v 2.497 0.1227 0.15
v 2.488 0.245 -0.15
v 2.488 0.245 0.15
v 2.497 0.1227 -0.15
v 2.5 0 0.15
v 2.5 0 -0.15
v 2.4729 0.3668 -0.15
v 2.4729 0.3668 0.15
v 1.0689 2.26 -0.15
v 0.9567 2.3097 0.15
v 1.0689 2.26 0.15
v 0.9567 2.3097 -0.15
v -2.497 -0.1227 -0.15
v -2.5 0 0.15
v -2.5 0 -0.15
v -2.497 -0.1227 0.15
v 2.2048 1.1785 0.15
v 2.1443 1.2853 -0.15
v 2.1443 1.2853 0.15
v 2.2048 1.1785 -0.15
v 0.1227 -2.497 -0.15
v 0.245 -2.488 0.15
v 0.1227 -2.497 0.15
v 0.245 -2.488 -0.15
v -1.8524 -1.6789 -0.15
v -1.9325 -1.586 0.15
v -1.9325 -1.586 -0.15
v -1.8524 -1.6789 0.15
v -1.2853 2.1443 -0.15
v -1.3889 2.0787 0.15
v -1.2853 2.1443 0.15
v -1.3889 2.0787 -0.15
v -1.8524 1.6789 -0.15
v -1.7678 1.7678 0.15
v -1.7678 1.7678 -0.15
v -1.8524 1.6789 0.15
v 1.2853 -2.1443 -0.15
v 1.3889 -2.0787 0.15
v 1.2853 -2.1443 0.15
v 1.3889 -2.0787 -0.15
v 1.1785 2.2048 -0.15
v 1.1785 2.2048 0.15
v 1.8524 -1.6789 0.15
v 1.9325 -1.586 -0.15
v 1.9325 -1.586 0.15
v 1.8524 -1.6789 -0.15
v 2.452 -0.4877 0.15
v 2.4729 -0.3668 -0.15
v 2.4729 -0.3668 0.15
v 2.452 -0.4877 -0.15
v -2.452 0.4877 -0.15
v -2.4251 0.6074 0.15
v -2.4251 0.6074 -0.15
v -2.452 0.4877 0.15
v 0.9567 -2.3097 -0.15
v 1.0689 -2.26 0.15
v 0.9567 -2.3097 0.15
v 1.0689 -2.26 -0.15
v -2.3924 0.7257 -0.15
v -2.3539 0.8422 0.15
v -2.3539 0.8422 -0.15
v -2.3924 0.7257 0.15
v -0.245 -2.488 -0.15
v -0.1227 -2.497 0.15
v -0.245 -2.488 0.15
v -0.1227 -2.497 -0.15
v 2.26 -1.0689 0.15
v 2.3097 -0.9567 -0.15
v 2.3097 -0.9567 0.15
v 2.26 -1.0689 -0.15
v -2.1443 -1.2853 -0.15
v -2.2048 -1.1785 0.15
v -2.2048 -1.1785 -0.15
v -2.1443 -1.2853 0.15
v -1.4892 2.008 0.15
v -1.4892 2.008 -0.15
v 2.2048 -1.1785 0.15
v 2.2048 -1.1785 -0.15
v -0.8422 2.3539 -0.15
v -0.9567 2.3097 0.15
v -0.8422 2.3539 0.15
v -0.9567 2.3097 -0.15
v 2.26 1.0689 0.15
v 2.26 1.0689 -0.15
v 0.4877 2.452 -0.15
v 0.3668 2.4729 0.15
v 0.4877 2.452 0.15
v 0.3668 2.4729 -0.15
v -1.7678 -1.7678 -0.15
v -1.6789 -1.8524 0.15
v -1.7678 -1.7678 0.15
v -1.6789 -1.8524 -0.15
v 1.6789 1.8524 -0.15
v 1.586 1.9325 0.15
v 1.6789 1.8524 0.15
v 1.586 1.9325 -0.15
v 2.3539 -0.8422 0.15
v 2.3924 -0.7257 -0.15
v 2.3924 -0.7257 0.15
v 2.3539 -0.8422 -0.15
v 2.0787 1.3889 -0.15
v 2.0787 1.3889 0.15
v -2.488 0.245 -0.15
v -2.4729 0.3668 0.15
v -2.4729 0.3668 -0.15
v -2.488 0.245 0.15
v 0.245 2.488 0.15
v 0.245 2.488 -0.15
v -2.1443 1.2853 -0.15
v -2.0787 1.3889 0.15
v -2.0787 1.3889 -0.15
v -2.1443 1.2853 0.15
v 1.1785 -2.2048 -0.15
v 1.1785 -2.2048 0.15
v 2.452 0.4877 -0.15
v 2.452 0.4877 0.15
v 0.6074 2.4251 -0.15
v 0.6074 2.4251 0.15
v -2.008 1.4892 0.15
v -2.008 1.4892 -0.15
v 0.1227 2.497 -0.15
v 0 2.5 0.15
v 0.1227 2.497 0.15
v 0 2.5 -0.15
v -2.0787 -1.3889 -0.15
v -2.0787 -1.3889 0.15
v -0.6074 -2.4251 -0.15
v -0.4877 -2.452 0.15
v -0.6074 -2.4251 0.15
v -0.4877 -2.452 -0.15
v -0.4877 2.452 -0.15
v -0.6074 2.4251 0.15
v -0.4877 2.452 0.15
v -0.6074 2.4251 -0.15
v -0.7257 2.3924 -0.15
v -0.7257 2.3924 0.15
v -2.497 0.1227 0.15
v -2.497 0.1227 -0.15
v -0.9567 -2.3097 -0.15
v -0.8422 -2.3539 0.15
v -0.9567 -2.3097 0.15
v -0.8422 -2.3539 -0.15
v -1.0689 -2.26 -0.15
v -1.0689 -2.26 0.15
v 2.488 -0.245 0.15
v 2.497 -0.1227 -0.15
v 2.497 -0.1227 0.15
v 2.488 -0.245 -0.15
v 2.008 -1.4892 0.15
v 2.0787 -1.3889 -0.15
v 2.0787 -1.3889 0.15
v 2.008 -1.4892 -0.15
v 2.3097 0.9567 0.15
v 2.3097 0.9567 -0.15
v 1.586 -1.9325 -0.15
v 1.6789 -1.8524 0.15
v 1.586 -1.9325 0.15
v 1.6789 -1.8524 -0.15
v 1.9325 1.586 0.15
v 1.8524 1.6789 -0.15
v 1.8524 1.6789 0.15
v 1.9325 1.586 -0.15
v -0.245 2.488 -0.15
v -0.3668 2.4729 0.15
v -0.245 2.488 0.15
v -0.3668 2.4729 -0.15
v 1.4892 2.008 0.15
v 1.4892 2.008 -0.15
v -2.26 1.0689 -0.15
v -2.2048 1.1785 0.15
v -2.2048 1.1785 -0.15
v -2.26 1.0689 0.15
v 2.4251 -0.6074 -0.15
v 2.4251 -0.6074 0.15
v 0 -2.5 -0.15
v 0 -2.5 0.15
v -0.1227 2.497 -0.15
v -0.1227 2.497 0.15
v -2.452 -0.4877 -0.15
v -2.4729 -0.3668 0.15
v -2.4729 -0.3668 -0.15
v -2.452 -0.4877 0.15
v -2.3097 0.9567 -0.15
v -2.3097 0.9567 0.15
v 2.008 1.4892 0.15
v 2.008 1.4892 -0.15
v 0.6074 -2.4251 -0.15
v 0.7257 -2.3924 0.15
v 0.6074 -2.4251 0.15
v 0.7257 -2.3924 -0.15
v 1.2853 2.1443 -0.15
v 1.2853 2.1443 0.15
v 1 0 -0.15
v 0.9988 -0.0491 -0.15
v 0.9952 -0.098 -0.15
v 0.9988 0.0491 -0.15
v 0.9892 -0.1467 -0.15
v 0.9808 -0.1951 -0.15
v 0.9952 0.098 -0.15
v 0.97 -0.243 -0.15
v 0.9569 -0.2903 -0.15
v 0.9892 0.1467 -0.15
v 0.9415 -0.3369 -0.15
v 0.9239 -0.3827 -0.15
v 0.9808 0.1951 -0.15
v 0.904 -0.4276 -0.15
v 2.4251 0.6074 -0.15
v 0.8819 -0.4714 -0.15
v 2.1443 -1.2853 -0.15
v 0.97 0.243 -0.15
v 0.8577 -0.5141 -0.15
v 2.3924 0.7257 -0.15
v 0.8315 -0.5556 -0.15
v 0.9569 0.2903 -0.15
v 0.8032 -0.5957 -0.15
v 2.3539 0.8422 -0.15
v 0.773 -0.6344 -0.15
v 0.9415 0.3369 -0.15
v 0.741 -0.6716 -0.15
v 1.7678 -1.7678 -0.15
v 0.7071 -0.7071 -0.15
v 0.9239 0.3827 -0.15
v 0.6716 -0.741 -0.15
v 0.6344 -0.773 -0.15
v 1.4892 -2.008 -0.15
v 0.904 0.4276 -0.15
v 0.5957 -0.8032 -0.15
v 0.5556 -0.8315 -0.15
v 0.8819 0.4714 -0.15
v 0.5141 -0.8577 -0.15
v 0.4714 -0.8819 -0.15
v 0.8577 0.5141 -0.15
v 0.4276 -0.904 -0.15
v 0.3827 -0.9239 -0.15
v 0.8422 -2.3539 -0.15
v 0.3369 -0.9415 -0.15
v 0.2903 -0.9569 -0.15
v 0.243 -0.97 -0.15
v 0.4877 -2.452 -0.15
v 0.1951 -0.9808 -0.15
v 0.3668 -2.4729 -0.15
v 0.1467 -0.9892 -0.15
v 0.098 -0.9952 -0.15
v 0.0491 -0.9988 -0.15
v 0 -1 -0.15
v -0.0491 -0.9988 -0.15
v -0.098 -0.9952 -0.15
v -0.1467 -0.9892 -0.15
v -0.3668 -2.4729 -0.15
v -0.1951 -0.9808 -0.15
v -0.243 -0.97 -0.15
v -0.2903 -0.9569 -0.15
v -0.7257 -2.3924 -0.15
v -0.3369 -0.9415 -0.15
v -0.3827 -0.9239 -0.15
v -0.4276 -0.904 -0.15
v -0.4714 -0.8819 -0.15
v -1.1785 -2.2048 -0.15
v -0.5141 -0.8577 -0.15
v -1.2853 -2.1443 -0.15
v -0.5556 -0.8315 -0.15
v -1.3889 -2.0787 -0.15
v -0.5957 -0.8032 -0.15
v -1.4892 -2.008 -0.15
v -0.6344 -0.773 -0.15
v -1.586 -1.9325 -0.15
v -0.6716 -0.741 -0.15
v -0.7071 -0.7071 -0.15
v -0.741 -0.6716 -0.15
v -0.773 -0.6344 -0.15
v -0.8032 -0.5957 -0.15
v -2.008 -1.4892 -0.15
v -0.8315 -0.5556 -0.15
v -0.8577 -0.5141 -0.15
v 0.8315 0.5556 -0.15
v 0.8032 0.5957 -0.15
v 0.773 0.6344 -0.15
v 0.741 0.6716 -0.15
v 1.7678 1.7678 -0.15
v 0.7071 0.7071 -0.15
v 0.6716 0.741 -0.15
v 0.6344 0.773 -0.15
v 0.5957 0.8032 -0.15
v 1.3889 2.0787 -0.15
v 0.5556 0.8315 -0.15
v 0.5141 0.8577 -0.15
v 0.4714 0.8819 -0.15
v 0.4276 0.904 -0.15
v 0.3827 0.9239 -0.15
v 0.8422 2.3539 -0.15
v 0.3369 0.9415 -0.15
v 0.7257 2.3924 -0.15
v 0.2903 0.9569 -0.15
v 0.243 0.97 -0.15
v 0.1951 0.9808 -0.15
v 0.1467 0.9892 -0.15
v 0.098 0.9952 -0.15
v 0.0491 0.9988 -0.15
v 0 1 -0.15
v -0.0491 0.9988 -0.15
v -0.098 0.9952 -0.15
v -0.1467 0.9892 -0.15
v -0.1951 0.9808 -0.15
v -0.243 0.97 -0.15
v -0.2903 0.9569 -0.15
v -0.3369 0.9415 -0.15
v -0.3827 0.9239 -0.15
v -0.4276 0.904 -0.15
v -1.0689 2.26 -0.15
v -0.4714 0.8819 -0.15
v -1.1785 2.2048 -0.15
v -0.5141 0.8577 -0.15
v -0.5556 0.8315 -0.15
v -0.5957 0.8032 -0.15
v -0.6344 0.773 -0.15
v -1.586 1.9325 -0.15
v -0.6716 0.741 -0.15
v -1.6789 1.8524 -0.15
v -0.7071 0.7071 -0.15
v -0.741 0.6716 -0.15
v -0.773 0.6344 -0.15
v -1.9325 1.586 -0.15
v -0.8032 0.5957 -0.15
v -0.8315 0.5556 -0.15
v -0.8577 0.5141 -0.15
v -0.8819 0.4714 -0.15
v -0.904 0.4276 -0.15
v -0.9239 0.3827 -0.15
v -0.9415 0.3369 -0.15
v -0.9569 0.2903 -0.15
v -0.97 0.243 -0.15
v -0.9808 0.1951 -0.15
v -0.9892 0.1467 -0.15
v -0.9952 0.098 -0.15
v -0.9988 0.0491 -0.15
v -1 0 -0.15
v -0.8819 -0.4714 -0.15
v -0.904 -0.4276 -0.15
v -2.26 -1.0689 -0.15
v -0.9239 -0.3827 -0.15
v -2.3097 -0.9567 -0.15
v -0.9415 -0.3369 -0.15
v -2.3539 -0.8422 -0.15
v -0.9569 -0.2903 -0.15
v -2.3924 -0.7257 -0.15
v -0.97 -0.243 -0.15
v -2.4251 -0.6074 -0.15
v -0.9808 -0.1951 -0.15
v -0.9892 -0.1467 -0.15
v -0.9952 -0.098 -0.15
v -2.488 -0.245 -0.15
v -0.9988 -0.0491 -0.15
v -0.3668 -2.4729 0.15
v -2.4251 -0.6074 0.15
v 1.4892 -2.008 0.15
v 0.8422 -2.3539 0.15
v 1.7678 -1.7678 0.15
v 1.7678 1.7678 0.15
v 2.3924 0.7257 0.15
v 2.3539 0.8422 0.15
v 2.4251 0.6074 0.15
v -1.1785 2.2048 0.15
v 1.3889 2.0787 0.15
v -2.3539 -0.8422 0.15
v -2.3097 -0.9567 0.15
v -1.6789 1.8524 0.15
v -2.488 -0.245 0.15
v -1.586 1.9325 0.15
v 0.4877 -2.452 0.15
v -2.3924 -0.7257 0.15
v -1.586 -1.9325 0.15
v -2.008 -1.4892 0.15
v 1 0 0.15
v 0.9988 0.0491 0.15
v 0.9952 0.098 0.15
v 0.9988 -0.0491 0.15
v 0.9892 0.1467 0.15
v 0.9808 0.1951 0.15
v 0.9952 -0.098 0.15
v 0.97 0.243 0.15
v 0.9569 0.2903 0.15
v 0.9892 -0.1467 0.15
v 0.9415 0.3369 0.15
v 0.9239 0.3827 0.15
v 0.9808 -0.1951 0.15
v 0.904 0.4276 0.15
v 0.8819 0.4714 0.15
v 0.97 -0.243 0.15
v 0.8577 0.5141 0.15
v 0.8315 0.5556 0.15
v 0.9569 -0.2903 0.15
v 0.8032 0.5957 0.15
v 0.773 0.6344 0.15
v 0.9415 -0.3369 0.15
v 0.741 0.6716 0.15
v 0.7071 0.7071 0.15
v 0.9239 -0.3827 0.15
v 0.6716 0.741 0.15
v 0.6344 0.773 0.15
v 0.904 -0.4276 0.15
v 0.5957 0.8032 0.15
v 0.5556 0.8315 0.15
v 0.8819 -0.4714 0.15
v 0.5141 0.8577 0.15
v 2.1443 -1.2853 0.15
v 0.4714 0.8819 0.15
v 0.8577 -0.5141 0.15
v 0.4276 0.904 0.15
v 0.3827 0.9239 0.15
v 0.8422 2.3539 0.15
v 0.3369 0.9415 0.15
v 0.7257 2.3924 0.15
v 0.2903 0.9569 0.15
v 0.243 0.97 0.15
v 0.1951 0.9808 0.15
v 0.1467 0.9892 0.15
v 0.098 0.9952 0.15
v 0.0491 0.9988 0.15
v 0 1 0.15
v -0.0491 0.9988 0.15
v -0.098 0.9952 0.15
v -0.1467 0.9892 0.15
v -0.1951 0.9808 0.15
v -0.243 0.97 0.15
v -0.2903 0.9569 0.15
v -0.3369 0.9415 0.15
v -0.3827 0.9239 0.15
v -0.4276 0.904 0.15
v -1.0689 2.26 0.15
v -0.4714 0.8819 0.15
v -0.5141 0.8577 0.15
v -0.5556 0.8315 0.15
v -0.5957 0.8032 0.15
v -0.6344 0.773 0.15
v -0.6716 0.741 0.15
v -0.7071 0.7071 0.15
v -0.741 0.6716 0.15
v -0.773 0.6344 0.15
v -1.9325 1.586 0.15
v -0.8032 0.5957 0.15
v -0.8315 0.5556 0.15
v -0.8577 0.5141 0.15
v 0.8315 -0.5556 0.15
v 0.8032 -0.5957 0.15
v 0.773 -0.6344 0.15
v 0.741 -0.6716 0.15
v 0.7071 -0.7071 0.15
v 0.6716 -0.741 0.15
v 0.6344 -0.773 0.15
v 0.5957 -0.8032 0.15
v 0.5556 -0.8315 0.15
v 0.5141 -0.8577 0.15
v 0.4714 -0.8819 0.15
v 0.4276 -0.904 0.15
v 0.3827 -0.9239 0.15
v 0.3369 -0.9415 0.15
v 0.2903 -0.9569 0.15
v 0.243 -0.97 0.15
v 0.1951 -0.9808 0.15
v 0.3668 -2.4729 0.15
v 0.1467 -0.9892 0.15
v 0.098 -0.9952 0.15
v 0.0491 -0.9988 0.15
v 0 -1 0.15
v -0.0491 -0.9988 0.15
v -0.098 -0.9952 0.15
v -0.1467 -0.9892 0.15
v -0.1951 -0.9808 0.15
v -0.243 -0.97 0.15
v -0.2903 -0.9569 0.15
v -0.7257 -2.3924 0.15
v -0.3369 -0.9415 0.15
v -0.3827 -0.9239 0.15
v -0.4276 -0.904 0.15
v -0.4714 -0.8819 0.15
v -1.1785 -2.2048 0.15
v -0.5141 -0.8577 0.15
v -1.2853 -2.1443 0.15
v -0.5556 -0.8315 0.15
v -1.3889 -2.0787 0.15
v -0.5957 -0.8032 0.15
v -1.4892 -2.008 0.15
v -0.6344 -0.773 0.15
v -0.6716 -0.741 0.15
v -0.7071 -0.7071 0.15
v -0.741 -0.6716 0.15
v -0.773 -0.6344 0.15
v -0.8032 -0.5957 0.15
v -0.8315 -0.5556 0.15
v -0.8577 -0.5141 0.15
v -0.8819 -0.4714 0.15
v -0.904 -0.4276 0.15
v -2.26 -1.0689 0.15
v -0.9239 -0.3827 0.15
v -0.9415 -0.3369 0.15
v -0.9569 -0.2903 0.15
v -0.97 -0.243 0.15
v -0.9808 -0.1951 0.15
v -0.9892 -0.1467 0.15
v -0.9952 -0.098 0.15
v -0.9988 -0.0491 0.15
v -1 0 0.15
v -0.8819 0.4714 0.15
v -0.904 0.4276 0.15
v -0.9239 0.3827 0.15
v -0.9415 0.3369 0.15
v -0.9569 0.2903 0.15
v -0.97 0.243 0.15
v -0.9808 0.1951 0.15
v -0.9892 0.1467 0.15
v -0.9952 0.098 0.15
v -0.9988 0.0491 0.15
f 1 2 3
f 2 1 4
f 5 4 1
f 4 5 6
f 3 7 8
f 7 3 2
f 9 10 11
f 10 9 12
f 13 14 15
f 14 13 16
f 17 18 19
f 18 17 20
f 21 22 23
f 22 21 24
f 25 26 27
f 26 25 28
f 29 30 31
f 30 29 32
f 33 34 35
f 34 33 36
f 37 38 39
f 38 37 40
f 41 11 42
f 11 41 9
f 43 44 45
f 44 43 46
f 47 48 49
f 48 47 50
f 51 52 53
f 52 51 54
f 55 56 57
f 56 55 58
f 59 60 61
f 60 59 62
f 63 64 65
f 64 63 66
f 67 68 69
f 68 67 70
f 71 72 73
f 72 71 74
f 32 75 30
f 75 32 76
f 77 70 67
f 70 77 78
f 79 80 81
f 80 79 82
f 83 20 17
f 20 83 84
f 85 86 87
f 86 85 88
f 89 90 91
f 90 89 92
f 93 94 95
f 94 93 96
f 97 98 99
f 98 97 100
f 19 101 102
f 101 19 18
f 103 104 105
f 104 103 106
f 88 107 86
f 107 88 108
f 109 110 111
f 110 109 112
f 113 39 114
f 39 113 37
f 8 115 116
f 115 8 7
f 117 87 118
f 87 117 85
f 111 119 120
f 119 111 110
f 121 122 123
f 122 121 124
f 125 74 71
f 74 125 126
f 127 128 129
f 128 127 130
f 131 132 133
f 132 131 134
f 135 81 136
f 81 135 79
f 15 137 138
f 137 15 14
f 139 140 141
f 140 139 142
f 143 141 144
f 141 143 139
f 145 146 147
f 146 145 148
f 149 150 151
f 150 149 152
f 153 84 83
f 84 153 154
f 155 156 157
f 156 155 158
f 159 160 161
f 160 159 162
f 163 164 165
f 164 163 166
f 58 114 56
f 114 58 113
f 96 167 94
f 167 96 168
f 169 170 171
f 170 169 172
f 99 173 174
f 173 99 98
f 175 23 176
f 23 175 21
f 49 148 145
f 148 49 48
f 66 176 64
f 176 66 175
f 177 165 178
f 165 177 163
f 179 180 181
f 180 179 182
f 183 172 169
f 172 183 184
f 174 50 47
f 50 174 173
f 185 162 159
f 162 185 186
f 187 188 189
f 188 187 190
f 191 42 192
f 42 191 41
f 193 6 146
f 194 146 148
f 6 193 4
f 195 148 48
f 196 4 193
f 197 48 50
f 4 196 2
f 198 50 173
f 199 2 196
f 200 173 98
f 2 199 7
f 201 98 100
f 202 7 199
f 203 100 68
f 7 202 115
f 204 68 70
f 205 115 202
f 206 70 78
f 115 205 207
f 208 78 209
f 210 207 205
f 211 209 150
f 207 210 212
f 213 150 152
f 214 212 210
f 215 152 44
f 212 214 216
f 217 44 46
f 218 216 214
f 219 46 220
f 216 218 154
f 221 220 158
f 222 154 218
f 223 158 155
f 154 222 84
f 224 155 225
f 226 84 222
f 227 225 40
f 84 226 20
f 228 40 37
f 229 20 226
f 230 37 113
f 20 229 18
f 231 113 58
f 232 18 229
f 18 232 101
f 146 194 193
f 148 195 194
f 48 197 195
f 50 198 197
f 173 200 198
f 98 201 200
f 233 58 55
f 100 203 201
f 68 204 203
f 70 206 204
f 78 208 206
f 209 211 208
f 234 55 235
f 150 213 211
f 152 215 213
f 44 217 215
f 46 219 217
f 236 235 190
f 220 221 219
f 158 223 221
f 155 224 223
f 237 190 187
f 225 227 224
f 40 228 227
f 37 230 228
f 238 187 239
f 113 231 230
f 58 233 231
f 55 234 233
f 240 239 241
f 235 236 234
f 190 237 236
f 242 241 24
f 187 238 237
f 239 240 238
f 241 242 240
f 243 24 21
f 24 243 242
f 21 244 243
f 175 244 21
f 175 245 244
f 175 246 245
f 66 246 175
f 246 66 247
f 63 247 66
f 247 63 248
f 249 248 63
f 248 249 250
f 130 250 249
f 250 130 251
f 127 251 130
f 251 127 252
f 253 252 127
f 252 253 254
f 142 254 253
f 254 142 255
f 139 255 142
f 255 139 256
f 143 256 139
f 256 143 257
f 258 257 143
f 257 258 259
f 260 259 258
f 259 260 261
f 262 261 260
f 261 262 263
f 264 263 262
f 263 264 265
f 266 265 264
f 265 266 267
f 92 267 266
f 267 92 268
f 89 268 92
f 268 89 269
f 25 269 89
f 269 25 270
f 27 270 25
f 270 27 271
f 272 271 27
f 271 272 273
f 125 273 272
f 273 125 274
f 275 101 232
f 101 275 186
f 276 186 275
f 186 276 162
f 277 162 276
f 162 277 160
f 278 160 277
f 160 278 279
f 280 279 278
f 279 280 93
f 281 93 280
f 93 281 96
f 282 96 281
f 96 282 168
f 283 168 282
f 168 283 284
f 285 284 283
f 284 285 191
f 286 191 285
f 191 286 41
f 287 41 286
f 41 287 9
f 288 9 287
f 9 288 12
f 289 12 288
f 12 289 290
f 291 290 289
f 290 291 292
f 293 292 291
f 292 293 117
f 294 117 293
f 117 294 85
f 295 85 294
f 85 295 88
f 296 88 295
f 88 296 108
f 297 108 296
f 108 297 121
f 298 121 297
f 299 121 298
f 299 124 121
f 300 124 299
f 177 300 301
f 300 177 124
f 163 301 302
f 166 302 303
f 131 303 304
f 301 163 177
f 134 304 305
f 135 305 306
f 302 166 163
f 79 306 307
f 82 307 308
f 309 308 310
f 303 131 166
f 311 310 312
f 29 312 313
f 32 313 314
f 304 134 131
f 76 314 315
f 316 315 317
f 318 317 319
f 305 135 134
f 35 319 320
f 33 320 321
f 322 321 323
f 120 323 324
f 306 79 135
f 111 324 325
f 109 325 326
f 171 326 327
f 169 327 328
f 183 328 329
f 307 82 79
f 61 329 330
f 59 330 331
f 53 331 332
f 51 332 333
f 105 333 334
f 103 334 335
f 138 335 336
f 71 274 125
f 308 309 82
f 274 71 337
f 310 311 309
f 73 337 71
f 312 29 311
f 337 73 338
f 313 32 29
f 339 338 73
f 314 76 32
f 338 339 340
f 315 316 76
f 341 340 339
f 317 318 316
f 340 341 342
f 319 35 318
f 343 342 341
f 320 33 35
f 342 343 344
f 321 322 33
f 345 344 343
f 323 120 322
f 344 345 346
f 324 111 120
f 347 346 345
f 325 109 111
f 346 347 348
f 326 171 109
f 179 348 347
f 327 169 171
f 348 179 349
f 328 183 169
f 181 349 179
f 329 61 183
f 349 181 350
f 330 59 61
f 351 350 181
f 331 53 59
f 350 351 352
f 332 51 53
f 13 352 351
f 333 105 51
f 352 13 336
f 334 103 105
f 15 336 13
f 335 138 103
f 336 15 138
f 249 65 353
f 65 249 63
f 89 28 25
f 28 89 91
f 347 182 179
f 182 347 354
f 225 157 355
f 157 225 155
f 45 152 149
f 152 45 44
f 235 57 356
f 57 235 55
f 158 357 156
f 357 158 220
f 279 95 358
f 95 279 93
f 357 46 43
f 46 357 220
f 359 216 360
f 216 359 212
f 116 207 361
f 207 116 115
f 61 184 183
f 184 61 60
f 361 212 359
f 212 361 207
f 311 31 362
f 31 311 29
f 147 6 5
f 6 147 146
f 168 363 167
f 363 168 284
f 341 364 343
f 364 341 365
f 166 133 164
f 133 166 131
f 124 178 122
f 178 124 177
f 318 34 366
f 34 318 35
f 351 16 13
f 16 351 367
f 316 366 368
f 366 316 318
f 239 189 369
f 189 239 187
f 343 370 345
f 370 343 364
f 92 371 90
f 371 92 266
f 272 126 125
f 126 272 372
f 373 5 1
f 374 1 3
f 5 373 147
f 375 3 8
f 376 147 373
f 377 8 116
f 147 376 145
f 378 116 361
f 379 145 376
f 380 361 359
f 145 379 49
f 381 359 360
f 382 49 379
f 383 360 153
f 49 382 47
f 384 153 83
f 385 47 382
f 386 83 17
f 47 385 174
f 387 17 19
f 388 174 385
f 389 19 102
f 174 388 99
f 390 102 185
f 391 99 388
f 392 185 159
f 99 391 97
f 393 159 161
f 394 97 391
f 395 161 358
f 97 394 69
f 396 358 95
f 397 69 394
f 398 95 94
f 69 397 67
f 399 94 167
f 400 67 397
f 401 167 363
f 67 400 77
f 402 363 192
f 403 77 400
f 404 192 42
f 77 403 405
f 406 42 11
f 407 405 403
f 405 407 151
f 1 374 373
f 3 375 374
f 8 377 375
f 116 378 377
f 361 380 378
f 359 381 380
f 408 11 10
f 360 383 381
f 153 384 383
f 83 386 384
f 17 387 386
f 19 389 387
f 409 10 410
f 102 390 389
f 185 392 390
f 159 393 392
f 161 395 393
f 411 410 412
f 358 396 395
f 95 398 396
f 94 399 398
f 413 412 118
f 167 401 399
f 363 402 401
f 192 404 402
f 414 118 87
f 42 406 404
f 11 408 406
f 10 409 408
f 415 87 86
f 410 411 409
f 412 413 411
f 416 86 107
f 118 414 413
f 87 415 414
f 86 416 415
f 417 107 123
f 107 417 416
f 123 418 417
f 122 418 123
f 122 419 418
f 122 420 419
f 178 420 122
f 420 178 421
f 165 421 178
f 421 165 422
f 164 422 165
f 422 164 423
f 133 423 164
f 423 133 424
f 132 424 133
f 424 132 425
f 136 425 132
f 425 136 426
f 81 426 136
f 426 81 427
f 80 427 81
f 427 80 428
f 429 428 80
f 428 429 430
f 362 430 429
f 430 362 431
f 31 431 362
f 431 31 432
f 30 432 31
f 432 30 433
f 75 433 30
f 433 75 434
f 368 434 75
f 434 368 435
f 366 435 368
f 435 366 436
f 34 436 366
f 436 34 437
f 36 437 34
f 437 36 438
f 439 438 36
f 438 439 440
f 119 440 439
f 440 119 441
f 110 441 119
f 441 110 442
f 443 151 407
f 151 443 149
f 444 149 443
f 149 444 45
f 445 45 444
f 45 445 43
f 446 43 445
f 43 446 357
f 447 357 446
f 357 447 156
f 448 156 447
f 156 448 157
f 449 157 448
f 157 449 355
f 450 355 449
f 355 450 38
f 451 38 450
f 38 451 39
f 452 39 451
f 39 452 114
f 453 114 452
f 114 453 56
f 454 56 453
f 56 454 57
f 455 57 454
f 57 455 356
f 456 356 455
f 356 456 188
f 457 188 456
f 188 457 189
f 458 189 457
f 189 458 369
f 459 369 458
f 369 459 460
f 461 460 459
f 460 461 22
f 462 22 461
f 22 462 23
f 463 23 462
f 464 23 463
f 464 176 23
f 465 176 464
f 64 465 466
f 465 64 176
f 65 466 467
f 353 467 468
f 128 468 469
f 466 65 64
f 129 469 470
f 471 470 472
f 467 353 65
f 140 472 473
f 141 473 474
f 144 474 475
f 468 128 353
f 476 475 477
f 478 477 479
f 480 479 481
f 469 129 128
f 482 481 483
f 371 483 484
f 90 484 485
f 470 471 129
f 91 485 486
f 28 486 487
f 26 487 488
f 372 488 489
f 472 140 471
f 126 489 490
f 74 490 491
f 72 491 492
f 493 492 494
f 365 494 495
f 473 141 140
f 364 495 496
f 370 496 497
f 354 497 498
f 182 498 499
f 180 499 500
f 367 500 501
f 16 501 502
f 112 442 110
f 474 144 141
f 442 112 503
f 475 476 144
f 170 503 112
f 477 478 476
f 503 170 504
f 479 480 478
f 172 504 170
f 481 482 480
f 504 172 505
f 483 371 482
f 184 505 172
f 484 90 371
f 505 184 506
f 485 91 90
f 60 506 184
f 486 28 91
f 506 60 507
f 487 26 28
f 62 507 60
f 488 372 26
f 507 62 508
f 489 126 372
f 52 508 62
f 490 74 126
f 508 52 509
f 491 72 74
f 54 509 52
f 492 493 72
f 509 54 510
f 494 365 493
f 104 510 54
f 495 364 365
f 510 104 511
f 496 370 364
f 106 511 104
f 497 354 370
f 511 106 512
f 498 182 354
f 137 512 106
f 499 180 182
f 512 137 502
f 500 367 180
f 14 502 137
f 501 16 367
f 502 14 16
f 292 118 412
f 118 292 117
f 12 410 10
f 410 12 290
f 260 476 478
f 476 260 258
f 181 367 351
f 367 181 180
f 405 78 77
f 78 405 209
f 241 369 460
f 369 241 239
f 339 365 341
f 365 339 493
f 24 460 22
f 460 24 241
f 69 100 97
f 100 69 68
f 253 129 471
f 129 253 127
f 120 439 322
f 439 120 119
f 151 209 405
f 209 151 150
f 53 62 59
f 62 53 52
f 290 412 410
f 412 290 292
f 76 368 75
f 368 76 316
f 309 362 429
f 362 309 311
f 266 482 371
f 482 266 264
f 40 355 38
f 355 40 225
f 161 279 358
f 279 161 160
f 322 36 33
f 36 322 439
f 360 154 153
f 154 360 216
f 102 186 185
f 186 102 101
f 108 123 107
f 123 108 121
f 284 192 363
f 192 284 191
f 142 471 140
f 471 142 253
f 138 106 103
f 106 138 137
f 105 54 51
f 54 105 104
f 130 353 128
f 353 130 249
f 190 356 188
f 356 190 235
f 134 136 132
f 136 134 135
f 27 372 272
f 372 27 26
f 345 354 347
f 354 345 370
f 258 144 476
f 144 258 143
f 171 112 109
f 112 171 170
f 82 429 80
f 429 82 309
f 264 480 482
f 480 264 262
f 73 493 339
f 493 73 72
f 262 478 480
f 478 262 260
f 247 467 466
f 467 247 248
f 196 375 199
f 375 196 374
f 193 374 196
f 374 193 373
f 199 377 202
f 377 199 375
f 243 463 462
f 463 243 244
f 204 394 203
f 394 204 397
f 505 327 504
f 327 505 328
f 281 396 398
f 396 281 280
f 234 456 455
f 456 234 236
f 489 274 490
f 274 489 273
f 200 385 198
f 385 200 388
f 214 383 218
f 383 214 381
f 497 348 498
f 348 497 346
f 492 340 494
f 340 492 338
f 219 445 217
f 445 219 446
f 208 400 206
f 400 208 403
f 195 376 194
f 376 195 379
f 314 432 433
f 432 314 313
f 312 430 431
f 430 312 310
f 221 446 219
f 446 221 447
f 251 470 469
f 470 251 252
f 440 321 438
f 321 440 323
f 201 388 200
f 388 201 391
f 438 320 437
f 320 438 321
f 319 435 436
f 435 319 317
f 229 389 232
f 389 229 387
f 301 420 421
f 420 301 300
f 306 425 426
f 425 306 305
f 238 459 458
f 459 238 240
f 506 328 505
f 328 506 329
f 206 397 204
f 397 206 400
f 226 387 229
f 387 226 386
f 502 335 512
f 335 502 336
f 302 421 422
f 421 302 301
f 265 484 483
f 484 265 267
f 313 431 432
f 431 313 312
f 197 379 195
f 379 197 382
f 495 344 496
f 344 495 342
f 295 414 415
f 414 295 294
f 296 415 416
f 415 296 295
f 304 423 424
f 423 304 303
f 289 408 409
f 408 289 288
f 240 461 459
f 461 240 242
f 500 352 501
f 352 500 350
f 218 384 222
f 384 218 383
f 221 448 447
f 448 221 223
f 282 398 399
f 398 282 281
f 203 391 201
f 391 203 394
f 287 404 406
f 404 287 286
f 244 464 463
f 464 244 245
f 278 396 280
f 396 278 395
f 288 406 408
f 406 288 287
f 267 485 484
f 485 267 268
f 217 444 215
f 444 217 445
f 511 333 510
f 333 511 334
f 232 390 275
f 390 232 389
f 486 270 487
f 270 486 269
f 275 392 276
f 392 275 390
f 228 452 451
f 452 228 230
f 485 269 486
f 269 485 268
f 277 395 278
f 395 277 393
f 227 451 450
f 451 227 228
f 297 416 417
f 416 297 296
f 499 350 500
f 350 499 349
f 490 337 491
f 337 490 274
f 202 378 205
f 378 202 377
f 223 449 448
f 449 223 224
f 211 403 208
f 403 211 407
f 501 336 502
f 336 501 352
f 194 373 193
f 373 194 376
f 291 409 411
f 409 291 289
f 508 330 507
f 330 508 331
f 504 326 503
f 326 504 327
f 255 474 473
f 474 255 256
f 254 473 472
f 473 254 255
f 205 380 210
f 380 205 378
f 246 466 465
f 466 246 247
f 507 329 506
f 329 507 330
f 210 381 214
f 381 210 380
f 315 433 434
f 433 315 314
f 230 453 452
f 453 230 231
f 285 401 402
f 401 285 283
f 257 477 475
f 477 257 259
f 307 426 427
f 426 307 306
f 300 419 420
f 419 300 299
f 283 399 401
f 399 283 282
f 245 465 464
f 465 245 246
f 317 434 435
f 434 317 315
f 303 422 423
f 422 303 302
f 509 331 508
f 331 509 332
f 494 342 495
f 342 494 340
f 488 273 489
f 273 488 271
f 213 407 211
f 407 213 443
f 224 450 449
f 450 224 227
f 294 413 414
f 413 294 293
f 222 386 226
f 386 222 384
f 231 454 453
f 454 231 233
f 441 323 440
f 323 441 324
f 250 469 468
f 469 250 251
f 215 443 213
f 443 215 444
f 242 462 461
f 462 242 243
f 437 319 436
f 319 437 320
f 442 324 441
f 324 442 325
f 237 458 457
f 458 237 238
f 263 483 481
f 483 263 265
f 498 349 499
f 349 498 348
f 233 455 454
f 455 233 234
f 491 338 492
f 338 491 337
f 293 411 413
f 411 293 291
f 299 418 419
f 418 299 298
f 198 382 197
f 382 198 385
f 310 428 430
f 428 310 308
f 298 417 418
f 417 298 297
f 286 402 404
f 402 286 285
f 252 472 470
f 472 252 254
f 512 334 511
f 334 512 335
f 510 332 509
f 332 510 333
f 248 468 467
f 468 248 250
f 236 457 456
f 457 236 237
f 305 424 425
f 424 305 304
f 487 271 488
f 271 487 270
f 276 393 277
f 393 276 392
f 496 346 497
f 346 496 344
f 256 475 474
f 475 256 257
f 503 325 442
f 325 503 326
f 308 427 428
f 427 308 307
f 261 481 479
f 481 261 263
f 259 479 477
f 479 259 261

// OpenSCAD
$fn=128;

module washer(id=2.0, od=5.0, thickness=0.3) {
    difference() {
        cylinder(h=thickness, d=od, center=true);
        cylinder(h=thickness+0.2, d=id, center=true);
    }
}

washer();
